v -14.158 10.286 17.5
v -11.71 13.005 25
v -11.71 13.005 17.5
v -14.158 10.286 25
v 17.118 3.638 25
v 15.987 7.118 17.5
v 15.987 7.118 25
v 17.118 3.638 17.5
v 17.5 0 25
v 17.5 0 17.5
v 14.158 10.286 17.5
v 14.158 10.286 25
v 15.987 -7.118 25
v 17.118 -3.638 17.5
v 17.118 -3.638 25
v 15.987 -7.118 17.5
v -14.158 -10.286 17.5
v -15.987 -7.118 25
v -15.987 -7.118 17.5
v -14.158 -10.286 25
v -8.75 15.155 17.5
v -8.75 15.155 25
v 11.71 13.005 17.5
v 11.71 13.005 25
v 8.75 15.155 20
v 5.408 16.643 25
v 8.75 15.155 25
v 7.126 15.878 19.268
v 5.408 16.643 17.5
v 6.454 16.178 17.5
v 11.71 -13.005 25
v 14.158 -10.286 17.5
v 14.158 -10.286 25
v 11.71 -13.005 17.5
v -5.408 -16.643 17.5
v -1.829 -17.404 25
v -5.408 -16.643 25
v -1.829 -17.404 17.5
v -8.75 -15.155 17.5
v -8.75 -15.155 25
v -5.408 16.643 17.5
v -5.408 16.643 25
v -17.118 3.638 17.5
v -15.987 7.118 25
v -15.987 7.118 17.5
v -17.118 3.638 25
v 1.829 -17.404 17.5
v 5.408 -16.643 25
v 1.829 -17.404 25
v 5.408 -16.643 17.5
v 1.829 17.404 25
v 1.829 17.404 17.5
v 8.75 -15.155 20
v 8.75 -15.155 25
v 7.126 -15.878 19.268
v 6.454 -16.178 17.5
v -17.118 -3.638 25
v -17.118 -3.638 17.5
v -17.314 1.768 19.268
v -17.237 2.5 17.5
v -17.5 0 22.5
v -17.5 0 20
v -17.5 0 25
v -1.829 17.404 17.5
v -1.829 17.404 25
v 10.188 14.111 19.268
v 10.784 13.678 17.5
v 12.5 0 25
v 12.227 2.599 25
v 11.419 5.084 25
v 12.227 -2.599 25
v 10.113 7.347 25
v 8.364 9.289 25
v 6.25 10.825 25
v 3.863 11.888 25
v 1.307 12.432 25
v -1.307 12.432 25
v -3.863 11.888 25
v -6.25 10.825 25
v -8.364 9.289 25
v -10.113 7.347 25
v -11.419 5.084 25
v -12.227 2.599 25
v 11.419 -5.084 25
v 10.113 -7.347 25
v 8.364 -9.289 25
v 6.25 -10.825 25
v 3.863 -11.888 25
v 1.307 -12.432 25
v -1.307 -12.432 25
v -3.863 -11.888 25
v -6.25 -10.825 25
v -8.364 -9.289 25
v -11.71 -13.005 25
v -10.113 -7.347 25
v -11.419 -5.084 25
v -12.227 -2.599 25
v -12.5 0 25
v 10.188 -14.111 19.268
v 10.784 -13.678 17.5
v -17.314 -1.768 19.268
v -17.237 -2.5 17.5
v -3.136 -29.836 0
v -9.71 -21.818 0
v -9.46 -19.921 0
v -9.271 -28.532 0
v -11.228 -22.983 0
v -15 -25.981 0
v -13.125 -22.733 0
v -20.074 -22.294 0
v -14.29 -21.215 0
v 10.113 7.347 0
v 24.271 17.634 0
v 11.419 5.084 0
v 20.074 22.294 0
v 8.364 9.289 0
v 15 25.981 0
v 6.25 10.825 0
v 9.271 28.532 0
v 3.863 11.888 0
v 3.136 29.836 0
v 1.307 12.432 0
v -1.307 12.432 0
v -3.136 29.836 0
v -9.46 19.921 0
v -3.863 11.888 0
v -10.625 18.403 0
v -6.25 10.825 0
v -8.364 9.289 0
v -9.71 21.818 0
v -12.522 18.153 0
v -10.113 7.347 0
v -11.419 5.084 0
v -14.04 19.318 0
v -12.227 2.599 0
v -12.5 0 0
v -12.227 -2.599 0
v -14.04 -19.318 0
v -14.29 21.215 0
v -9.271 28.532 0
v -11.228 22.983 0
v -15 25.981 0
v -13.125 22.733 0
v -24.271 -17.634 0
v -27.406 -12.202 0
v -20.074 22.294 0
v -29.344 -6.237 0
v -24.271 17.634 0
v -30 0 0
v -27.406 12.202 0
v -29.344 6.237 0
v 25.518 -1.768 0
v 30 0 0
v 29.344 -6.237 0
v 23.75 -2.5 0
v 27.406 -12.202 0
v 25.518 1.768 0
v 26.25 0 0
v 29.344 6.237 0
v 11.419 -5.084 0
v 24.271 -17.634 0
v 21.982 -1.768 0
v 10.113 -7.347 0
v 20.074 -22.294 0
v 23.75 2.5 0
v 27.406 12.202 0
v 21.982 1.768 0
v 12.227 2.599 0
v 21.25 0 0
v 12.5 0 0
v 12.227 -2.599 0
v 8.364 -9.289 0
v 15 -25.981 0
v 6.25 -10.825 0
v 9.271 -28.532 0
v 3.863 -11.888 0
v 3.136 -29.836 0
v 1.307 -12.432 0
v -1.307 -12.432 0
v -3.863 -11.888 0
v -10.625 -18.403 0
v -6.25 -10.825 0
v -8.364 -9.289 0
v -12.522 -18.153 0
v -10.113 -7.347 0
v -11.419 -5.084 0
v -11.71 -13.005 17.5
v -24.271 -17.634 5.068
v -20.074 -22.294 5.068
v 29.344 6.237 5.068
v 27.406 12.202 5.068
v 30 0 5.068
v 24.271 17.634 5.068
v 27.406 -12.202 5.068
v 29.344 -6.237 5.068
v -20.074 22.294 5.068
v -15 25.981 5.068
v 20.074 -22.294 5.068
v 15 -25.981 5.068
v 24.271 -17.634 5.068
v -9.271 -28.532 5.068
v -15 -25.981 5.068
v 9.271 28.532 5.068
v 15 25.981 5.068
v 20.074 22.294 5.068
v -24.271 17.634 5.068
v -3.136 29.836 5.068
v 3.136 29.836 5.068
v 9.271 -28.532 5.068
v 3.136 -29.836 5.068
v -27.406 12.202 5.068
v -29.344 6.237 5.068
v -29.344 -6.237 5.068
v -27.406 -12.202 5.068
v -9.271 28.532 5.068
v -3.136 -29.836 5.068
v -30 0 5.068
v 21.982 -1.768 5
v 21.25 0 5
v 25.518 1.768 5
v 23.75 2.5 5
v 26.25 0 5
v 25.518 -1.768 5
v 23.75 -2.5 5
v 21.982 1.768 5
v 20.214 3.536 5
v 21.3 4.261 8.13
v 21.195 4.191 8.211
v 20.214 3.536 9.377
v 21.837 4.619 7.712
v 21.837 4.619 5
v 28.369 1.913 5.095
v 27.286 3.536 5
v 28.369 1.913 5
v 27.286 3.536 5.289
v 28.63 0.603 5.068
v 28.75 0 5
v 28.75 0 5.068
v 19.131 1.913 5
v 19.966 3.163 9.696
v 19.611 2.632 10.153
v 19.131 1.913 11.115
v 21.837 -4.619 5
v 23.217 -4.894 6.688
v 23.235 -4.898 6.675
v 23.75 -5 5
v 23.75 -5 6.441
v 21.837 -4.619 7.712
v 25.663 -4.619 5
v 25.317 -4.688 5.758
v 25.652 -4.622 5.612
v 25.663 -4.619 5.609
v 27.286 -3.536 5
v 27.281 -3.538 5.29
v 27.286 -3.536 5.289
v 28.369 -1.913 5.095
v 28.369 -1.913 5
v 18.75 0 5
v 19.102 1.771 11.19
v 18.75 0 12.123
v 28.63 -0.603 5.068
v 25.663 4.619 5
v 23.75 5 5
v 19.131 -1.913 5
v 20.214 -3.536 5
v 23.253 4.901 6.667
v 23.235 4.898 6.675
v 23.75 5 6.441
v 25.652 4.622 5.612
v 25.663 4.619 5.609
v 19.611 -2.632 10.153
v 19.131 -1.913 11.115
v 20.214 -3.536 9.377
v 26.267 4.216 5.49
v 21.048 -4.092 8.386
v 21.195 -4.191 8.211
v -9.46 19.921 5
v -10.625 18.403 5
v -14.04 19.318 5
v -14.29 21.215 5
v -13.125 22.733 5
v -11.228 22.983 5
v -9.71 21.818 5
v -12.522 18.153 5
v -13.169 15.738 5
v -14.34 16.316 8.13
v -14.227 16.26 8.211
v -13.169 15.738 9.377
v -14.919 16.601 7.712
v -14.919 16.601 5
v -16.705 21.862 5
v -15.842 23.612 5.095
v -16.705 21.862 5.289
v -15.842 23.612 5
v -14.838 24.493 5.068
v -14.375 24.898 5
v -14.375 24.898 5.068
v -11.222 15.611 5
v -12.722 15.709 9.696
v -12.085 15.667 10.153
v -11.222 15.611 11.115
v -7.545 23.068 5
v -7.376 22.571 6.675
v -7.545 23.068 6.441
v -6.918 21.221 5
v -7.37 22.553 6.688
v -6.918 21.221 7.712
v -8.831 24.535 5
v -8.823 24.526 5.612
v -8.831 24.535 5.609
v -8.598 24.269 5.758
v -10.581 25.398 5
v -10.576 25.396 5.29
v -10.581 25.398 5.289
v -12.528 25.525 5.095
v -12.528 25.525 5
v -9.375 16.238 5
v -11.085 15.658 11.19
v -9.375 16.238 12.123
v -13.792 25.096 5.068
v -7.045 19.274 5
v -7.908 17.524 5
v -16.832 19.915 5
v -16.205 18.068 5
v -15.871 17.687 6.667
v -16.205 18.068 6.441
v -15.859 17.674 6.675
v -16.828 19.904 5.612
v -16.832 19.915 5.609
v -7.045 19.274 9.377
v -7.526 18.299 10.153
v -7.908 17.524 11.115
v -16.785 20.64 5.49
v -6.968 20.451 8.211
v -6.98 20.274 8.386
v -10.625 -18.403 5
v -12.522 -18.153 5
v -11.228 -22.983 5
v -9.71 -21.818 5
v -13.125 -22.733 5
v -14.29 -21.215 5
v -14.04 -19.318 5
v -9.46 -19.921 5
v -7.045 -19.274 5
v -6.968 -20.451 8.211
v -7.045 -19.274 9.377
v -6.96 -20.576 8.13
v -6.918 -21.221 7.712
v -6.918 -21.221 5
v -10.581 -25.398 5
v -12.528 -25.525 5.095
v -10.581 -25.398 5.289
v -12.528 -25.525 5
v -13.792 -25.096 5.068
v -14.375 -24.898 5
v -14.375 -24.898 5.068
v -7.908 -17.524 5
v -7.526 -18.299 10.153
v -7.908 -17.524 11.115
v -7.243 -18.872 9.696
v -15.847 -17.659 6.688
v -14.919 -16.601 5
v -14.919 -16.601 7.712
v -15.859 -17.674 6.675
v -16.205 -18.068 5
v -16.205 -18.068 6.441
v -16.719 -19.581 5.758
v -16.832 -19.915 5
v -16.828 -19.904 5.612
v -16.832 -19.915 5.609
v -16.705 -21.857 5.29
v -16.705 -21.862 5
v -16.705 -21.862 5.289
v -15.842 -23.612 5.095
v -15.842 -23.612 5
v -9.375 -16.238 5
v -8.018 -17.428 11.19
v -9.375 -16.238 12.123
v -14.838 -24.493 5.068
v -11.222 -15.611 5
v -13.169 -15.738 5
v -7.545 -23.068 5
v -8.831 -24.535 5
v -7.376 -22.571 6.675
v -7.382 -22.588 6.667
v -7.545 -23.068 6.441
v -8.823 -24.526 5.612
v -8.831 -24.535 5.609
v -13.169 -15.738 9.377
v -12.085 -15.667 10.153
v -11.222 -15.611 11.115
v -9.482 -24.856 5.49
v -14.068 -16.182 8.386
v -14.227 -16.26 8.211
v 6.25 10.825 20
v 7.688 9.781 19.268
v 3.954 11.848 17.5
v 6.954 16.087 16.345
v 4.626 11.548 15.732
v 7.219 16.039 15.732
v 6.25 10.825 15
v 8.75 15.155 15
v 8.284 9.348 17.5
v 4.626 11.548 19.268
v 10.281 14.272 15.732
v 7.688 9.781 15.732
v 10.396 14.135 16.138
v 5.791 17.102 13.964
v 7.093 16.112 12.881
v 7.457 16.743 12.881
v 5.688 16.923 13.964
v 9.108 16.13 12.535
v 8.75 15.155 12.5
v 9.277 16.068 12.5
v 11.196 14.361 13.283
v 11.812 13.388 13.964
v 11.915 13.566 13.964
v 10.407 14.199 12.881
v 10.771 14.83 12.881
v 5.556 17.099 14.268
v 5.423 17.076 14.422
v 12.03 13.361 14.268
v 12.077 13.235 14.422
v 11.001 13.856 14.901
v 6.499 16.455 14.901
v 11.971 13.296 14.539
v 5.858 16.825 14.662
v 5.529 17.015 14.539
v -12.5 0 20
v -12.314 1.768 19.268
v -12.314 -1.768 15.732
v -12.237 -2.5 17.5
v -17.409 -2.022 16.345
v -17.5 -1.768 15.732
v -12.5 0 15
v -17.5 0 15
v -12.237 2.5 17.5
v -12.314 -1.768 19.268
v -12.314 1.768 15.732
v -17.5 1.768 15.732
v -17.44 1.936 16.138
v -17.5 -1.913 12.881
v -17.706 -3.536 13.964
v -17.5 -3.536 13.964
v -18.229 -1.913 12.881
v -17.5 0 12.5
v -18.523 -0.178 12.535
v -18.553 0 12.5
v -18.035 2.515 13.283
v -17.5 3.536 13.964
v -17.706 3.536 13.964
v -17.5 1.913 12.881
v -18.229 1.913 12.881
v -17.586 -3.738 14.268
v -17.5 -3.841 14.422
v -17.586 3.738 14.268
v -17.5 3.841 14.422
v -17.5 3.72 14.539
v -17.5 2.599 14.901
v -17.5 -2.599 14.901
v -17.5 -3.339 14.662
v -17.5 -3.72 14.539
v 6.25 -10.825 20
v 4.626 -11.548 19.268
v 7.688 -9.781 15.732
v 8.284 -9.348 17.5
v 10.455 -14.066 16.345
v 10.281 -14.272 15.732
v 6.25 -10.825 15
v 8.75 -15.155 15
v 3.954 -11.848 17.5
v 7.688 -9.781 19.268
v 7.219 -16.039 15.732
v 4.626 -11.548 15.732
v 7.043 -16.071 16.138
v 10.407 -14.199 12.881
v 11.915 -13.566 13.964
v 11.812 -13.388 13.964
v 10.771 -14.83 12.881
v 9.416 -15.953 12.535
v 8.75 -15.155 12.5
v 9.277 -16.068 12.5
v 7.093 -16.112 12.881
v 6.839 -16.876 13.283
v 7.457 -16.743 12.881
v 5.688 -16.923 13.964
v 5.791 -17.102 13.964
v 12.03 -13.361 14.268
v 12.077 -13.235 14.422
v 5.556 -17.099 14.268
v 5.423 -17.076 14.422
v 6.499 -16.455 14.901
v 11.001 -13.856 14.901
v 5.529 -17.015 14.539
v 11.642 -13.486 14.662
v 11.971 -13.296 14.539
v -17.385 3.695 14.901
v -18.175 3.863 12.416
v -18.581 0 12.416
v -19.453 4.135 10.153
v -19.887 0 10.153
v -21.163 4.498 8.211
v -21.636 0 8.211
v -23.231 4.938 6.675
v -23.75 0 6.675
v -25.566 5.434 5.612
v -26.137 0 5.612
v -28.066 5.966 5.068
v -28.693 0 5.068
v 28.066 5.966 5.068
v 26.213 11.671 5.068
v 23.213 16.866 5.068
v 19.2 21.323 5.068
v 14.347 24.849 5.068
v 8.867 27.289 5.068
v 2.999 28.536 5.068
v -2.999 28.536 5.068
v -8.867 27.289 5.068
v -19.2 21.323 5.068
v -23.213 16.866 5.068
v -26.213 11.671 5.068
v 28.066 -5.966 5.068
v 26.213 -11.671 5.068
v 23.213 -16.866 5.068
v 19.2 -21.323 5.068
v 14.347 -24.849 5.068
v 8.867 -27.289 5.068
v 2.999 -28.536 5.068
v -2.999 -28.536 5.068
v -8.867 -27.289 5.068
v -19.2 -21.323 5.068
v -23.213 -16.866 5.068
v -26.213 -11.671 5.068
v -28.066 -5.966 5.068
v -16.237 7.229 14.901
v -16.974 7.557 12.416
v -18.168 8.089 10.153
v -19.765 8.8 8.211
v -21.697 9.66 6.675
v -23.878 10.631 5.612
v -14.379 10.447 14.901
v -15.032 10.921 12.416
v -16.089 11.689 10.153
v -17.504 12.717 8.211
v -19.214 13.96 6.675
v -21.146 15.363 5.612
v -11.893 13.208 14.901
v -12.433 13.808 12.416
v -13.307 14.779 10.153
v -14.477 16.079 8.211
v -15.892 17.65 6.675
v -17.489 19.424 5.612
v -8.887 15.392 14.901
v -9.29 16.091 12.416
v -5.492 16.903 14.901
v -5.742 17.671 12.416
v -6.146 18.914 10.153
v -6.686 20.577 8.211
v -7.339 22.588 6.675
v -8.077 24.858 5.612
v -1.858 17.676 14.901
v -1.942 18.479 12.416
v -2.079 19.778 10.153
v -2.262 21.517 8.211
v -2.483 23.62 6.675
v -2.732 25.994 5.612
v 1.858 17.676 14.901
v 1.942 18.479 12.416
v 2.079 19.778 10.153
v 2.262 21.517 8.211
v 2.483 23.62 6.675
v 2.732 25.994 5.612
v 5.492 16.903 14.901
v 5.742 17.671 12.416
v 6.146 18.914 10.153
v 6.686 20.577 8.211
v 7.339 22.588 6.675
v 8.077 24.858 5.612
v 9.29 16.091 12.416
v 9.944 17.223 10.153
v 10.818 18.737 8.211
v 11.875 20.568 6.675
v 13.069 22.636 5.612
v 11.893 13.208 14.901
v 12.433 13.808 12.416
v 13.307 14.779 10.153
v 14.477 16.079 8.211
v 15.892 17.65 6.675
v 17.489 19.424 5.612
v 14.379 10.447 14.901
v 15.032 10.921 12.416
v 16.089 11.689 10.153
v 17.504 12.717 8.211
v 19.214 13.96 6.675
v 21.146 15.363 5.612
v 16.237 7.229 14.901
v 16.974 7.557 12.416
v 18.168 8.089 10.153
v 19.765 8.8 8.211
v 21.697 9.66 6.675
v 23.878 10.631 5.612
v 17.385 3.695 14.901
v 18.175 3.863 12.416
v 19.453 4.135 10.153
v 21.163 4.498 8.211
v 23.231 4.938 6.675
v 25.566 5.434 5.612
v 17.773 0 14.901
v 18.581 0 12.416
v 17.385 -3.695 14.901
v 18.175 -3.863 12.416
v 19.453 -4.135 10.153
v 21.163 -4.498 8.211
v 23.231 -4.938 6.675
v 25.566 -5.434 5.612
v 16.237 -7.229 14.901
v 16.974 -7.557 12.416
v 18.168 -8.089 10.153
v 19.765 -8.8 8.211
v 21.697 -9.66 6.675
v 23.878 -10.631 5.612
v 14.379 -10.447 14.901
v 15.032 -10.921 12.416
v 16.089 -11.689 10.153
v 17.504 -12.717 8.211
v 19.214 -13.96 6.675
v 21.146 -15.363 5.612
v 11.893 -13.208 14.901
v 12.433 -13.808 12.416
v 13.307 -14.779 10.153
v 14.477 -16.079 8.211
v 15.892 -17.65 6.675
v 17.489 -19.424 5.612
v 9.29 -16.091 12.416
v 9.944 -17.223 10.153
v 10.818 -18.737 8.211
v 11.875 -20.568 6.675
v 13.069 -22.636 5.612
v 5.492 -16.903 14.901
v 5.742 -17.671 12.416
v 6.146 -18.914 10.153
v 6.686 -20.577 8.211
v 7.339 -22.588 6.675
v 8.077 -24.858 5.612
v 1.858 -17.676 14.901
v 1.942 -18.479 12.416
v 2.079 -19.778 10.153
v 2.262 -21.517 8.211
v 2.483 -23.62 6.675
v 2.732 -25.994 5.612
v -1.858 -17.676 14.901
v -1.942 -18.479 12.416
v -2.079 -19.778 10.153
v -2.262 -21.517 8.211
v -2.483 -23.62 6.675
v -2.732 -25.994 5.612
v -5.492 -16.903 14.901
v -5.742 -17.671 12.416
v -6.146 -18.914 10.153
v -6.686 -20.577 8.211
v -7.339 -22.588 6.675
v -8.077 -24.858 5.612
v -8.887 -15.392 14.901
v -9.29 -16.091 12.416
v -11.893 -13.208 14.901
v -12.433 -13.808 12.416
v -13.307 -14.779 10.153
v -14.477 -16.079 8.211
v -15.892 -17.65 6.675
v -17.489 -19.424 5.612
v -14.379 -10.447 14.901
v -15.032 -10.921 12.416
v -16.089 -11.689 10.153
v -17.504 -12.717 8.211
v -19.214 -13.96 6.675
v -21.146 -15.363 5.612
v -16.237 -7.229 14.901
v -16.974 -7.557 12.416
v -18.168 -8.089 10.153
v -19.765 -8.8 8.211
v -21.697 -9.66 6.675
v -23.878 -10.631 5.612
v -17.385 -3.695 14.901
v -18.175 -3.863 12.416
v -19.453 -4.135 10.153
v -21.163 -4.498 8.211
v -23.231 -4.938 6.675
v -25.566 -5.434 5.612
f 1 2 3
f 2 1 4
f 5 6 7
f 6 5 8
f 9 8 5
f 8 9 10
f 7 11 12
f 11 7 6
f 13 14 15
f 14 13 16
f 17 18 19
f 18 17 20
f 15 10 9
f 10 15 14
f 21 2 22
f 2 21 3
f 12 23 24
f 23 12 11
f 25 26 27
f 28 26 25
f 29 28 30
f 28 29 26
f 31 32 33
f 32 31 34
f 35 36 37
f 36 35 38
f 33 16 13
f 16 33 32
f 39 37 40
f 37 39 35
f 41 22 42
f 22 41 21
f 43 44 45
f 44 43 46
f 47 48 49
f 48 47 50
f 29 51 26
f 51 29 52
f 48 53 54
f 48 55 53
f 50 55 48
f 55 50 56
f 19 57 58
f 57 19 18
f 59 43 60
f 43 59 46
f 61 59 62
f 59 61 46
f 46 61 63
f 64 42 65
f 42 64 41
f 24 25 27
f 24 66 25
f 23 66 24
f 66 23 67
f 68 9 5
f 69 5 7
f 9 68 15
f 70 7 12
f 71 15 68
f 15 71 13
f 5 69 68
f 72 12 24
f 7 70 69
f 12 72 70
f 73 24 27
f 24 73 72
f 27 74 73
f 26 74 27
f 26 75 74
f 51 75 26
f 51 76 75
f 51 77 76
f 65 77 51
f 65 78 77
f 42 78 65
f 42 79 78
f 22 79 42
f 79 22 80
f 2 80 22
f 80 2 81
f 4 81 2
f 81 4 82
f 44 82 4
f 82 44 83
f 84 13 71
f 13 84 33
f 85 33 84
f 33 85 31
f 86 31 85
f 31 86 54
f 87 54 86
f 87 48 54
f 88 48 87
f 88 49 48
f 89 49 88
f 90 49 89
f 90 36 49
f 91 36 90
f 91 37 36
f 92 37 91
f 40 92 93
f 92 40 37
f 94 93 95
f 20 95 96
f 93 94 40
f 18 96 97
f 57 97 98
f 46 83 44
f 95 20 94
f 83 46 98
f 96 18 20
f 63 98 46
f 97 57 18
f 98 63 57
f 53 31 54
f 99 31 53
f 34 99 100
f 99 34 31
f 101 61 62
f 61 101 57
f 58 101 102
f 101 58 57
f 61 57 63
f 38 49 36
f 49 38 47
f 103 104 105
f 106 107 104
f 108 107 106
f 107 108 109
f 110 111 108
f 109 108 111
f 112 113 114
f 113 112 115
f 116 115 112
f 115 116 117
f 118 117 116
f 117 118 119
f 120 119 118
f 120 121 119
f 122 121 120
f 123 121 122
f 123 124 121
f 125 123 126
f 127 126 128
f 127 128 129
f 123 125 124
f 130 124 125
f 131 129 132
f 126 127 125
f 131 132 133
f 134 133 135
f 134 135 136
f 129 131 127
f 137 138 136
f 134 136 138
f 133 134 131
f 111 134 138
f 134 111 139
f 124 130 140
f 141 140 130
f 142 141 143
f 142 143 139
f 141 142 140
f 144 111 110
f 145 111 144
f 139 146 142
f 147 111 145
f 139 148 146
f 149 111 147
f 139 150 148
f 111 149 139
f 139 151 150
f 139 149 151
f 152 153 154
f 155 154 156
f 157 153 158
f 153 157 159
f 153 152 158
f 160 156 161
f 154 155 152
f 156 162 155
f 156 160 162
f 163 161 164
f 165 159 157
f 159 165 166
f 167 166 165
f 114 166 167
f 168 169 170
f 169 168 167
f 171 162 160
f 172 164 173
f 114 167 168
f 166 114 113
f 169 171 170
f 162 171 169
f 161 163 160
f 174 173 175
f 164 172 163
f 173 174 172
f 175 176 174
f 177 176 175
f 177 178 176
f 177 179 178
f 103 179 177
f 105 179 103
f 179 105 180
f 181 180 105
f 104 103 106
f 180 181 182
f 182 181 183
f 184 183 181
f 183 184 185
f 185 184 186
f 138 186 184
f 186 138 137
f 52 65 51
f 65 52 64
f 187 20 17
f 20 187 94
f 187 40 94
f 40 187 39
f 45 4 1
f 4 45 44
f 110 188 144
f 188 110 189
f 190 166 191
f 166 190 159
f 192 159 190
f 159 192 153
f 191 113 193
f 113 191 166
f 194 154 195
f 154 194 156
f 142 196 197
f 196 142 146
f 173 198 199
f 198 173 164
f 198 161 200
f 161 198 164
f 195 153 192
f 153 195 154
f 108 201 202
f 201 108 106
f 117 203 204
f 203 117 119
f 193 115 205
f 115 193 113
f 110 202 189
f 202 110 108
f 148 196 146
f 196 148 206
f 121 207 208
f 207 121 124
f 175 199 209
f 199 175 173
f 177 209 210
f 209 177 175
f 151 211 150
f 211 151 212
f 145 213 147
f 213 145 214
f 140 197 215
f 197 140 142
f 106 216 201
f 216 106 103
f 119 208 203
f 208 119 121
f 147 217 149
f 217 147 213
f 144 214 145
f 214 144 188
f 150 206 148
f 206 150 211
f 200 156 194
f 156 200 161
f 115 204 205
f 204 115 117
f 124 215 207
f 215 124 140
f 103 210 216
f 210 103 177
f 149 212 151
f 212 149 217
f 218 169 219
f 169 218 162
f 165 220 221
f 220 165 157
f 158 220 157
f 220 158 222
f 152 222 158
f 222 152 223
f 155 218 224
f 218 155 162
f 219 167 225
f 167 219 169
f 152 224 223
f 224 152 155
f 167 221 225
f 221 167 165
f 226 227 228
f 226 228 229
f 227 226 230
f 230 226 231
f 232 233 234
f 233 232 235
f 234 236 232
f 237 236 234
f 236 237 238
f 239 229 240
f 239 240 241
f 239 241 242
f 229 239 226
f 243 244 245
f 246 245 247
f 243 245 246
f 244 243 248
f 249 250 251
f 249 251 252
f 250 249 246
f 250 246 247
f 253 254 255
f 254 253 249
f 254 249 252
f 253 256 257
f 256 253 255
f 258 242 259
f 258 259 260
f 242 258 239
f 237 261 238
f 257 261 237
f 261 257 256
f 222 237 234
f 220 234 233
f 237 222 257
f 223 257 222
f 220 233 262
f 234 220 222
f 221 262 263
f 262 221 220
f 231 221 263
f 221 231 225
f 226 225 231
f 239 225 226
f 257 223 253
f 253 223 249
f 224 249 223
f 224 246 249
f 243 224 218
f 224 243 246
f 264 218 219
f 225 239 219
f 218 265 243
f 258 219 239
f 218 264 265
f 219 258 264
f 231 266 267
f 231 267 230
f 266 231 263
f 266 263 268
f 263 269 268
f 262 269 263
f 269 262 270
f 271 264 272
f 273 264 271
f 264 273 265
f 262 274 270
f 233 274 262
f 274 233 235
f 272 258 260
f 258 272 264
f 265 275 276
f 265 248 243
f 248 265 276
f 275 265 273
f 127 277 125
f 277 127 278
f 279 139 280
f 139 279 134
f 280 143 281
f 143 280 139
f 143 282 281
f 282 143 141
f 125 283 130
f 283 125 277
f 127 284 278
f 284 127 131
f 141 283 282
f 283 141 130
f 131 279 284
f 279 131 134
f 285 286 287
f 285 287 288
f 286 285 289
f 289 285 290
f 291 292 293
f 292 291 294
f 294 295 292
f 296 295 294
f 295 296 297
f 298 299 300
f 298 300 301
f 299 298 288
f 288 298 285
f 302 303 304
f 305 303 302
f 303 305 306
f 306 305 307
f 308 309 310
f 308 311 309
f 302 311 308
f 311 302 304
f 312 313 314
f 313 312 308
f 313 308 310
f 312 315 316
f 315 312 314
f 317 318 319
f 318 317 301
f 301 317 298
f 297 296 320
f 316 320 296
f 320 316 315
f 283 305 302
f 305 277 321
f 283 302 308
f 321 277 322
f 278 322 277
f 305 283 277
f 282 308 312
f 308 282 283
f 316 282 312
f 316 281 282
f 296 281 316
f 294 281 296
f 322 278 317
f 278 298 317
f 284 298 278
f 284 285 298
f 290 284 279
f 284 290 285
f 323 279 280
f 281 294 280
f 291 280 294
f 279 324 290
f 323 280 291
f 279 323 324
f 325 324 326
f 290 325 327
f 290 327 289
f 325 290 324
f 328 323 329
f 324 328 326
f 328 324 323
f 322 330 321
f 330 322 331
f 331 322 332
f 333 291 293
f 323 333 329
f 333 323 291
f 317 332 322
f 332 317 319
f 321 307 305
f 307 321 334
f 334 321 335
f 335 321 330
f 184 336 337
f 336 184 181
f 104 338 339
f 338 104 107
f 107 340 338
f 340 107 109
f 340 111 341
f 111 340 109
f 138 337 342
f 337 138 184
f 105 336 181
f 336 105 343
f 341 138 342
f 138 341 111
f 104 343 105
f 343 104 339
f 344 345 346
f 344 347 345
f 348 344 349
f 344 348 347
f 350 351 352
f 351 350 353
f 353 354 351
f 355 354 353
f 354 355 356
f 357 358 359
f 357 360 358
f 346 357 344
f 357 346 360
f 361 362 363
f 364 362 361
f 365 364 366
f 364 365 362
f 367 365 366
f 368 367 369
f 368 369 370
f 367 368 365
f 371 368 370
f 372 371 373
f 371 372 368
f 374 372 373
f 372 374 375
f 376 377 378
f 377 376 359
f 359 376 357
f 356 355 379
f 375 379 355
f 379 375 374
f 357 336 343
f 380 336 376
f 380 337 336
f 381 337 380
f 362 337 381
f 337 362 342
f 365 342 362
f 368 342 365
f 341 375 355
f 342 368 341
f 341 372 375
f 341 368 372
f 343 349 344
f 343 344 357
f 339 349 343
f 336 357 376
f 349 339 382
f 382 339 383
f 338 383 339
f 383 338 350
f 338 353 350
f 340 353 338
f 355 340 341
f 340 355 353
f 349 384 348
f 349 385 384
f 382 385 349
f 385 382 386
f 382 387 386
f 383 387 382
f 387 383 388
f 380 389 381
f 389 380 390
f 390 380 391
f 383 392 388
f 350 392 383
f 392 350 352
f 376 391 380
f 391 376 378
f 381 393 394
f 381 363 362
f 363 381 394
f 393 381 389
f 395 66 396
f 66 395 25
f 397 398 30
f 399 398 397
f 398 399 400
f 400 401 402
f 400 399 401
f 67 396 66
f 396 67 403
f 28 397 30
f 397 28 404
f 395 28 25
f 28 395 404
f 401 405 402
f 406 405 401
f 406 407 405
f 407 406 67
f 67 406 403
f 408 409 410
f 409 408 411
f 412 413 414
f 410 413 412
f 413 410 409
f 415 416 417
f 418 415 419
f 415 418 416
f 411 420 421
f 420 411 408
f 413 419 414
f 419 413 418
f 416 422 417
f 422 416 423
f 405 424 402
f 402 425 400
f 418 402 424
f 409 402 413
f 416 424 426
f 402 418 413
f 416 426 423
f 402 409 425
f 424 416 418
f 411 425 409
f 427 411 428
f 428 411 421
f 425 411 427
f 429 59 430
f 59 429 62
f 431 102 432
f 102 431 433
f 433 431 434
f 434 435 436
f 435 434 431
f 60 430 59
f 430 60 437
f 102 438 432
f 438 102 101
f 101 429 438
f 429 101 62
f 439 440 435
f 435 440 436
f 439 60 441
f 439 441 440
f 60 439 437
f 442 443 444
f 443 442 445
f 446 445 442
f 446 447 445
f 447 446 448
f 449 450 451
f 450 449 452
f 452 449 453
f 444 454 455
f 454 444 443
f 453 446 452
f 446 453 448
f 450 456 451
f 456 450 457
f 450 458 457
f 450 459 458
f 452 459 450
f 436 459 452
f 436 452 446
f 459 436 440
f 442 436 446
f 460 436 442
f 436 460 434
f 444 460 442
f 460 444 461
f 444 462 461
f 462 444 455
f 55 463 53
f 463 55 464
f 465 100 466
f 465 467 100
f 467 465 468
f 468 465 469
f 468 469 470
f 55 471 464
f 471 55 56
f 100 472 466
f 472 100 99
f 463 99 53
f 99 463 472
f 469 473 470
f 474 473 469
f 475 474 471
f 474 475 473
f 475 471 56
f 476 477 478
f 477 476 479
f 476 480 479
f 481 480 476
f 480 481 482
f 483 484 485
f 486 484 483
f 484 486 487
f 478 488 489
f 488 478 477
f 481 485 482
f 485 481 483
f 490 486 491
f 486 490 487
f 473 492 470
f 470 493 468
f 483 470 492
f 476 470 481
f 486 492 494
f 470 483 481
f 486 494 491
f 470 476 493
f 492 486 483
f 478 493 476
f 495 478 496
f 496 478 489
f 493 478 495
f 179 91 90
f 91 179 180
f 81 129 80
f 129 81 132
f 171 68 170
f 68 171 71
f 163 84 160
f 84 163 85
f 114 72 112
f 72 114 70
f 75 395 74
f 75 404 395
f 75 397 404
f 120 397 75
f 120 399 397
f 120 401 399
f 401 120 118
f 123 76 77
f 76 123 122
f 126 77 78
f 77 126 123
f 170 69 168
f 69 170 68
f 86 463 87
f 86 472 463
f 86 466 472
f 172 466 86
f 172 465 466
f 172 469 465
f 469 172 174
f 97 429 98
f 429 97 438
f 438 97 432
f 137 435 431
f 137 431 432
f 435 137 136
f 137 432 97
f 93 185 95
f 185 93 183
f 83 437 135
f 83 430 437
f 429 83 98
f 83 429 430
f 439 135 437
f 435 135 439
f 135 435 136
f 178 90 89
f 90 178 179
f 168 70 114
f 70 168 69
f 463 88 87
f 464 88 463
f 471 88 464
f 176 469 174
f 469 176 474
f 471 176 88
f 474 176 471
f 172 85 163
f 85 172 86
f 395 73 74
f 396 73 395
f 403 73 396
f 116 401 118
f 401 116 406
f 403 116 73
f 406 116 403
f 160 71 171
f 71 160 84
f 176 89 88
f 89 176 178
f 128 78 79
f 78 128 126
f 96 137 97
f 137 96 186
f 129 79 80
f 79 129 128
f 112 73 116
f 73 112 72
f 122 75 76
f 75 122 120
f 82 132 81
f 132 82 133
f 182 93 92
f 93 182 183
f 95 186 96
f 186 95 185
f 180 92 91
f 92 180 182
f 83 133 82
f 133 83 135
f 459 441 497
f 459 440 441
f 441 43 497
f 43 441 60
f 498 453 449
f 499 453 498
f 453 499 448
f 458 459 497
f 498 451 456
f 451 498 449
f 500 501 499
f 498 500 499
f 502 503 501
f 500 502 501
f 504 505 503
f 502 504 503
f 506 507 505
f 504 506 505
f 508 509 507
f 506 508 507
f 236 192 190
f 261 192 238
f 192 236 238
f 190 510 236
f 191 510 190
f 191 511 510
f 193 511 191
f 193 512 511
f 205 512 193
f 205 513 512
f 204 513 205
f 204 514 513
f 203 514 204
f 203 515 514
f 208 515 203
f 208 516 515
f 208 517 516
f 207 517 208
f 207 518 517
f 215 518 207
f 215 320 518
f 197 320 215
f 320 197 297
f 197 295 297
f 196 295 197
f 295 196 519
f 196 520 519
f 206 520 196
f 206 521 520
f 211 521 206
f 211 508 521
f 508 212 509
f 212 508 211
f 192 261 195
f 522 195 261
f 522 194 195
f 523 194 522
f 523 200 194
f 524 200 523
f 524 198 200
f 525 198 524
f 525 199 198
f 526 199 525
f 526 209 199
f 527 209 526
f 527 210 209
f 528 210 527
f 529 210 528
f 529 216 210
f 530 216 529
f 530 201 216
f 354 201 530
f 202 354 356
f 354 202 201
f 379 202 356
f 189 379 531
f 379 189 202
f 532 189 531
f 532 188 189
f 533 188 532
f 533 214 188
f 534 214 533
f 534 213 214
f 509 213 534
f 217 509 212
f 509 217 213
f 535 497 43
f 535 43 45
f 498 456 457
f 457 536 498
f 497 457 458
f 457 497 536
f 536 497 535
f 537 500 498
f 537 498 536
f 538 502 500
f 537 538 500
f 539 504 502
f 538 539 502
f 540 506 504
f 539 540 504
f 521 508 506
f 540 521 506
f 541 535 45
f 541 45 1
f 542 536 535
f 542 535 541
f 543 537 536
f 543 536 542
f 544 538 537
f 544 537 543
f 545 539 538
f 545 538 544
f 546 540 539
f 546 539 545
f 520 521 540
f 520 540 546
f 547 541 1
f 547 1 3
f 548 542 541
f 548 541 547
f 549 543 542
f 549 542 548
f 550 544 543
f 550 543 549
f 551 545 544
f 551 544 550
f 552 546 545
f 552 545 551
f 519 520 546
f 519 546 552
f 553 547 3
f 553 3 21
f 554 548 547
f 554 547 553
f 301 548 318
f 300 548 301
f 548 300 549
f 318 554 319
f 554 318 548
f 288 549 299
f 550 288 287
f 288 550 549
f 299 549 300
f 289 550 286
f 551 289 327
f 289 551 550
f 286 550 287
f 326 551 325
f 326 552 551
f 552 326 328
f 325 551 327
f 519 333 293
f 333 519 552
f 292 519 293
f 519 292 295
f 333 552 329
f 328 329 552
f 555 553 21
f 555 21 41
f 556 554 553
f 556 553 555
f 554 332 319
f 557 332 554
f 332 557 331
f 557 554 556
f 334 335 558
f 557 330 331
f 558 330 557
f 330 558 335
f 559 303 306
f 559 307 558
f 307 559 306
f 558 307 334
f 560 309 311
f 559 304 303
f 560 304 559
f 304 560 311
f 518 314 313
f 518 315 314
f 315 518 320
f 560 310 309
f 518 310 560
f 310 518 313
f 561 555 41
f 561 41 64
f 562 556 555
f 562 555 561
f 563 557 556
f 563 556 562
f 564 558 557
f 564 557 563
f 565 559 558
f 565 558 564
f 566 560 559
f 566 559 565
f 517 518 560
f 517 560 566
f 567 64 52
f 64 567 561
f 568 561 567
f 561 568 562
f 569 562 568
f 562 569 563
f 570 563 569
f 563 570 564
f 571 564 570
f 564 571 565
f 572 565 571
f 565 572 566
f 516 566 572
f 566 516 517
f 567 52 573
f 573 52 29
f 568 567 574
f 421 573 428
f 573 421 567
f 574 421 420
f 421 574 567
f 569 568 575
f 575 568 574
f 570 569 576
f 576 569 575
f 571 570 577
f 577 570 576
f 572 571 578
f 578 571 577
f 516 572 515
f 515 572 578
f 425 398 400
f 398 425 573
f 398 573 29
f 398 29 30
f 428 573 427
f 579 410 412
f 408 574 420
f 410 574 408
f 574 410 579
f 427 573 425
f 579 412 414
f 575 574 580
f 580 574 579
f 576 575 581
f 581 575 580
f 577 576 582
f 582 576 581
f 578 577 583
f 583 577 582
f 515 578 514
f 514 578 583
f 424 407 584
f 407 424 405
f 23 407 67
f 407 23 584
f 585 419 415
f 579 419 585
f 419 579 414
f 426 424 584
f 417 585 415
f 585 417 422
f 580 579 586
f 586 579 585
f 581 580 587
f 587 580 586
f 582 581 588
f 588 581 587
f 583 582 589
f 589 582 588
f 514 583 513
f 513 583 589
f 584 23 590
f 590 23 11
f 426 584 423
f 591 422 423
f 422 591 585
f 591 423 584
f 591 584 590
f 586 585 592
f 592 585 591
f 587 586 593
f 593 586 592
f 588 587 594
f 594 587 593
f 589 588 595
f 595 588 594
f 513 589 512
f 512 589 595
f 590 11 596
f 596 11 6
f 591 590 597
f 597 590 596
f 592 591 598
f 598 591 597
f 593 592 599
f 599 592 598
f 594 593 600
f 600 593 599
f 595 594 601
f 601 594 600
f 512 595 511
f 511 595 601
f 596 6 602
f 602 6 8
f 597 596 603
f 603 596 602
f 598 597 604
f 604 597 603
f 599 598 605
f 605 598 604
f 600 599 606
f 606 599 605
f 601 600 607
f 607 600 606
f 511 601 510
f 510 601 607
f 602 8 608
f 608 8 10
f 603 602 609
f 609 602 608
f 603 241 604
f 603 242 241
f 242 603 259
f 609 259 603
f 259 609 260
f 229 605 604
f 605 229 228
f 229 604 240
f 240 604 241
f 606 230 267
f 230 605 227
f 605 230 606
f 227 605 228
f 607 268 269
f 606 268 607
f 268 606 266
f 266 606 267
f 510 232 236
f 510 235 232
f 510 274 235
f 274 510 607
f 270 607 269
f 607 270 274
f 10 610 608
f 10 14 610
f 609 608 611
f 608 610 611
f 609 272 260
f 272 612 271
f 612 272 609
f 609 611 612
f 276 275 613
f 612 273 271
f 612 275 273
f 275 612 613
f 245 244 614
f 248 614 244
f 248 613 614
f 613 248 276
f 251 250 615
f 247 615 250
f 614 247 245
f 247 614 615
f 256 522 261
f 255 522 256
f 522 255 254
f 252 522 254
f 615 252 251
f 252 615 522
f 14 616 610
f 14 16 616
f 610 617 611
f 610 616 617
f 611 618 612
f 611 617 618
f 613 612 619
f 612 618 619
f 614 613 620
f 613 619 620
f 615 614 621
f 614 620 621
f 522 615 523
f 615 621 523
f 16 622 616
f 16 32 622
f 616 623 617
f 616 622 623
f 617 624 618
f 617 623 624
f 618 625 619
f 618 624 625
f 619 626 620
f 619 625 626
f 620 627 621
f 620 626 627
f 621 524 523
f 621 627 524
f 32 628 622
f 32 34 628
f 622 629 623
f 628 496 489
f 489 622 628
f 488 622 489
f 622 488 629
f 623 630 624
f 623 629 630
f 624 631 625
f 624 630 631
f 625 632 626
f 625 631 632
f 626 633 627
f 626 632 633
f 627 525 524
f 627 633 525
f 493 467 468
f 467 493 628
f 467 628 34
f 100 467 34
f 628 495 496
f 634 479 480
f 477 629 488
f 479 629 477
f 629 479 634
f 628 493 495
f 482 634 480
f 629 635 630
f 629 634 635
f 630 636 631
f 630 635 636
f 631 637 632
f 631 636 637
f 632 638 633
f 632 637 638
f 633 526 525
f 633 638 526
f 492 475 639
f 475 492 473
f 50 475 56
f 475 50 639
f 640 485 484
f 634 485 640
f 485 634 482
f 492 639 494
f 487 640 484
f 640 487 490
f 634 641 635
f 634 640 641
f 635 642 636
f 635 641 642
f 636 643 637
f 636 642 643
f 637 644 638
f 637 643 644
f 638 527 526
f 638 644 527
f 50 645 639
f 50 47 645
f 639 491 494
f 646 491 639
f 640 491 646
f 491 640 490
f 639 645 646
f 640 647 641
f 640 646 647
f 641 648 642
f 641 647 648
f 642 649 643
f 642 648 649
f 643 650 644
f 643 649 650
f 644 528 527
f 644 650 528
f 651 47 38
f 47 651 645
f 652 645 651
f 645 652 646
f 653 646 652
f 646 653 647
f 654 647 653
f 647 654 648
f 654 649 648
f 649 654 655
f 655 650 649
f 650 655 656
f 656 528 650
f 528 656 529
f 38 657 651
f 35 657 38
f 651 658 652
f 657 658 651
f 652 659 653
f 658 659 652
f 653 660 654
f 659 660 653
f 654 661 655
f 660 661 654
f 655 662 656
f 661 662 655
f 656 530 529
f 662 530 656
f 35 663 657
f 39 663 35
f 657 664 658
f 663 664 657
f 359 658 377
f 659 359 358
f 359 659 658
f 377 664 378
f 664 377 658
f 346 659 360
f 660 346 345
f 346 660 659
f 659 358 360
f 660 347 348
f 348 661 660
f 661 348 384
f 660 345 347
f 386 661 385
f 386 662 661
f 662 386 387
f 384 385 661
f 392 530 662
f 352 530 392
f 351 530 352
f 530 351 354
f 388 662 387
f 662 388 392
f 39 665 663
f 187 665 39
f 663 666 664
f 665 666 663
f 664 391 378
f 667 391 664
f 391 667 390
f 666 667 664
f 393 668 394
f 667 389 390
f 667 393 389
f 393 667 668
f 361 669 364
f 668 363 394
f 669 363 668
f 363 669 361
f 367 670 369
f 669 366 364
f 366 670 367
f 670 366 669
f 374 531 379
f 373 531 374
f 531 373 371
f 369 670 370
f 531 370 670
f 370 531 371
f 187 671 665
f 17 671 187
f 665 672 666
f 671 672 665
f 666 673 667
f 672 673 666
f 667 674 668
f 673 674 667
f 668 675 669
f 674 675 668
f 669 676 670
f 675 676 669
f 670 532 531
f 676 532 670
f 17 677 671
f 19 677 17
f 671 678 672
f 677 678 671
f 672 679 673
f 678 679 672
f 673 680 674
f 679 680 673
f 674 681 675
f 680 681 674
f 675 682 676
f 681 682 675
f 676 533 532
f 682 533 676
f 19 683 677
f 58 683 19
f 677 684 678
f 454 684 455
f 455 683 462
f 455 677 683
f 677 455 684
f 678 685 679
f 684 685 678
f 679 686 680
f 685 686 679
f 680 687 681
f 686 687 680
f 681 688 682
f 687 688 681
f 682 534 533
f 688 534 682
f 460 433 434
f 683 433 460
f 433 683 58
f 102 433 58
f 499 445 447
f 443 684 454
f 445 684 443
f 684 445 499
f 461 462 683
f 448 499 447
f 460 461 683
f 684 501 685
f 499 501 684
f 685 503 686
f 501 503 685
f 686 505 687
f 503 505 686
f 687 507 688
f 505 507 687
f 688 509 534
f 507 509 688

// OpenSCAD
// [FL_INDEX: keywords="openscad, 3d_parametric, Parametric_Pipe_Mounting_Flange, csg_solid" | COT="Parametric OpenSCAD design from 3DCodeverse"]
// Title: Parametric Pipe Mounting Flange

// Pipe or Rod Mounting Flange
// (c) 2013, Christopher "ScribbleJ" Jansen


// Minimum Thickness of Object
min_thick = 5;
// Diameter of Pipe/Rod
pipe_d    = 25;
// Diameter of Flange
flange_d  = 60;
// Height of Object
height    = 25;

// Number of Setscrew Holes
num_setscrews = 3;
// Number of Flange Bolts
num_bolts = 3;

// Diameter of Flange Bolt
bolt_d    = 5;
// Diameter of Flange Bolthead
bolthead_d = 10;

// Diameter of "Setscrew" Bolt
setscrew_d = 5;
// Diameter of "Setscrew" Bolthead
setscrewhead_d = 10;

/* [Hidden] */

s = flange_d - pipe_d - min_thick*2;

difference()
{
  union()
  {
    cylinder(r=pipe_d/2 + min_thick, h=height);
    cylinder(r=flange_d/2, h=s/2 + min_thick);
  }

  // Pipehole
  translate([0,0,-1]) cylinder(r=pipe_d/2, h=height+2);

  // Bolts
  if(num_bolts > 0)
  {
    for(x=[0:360/num_bolts:num_bolts*(360/num_bolts)])
    {
      rotate([0,0,x]) 
      {
        translate([pipe_d/2 + min_thick + s/4,0,-1]) 
        {
          cylinder(r=bolt_d/2, h=height);
          translate([0,0,min_thick + 1]) cylinder(r=bolthead_d/2, h=height);
        }
      }
    }
  }

  // Chamfer
  translate([0,0,min_thick+s/2]) rotate_extrude() translate([pipe_d/2+min_thick+s/2,0,0]) circle(r=s/2);

  // Setscrews
  if(num_setscrews > 0)
  {
    for(x=[0:360/num_setscrews:num_setscrews*(360/num_setscrews)])
    {
      translate([0,0,min_thick+s/2]) rotate([0,0,(360/(num_setscrews*2))+x]) rotate([0,90,0])
      {
        cylinder(r=setscrew_d/2, h=flange_d/2);
        translate([0,0,pipe_d/2 + min_thick]) cylinder(r=setscrewhead_d/2, h=flange_d/2);
      }
    }
  }


}
